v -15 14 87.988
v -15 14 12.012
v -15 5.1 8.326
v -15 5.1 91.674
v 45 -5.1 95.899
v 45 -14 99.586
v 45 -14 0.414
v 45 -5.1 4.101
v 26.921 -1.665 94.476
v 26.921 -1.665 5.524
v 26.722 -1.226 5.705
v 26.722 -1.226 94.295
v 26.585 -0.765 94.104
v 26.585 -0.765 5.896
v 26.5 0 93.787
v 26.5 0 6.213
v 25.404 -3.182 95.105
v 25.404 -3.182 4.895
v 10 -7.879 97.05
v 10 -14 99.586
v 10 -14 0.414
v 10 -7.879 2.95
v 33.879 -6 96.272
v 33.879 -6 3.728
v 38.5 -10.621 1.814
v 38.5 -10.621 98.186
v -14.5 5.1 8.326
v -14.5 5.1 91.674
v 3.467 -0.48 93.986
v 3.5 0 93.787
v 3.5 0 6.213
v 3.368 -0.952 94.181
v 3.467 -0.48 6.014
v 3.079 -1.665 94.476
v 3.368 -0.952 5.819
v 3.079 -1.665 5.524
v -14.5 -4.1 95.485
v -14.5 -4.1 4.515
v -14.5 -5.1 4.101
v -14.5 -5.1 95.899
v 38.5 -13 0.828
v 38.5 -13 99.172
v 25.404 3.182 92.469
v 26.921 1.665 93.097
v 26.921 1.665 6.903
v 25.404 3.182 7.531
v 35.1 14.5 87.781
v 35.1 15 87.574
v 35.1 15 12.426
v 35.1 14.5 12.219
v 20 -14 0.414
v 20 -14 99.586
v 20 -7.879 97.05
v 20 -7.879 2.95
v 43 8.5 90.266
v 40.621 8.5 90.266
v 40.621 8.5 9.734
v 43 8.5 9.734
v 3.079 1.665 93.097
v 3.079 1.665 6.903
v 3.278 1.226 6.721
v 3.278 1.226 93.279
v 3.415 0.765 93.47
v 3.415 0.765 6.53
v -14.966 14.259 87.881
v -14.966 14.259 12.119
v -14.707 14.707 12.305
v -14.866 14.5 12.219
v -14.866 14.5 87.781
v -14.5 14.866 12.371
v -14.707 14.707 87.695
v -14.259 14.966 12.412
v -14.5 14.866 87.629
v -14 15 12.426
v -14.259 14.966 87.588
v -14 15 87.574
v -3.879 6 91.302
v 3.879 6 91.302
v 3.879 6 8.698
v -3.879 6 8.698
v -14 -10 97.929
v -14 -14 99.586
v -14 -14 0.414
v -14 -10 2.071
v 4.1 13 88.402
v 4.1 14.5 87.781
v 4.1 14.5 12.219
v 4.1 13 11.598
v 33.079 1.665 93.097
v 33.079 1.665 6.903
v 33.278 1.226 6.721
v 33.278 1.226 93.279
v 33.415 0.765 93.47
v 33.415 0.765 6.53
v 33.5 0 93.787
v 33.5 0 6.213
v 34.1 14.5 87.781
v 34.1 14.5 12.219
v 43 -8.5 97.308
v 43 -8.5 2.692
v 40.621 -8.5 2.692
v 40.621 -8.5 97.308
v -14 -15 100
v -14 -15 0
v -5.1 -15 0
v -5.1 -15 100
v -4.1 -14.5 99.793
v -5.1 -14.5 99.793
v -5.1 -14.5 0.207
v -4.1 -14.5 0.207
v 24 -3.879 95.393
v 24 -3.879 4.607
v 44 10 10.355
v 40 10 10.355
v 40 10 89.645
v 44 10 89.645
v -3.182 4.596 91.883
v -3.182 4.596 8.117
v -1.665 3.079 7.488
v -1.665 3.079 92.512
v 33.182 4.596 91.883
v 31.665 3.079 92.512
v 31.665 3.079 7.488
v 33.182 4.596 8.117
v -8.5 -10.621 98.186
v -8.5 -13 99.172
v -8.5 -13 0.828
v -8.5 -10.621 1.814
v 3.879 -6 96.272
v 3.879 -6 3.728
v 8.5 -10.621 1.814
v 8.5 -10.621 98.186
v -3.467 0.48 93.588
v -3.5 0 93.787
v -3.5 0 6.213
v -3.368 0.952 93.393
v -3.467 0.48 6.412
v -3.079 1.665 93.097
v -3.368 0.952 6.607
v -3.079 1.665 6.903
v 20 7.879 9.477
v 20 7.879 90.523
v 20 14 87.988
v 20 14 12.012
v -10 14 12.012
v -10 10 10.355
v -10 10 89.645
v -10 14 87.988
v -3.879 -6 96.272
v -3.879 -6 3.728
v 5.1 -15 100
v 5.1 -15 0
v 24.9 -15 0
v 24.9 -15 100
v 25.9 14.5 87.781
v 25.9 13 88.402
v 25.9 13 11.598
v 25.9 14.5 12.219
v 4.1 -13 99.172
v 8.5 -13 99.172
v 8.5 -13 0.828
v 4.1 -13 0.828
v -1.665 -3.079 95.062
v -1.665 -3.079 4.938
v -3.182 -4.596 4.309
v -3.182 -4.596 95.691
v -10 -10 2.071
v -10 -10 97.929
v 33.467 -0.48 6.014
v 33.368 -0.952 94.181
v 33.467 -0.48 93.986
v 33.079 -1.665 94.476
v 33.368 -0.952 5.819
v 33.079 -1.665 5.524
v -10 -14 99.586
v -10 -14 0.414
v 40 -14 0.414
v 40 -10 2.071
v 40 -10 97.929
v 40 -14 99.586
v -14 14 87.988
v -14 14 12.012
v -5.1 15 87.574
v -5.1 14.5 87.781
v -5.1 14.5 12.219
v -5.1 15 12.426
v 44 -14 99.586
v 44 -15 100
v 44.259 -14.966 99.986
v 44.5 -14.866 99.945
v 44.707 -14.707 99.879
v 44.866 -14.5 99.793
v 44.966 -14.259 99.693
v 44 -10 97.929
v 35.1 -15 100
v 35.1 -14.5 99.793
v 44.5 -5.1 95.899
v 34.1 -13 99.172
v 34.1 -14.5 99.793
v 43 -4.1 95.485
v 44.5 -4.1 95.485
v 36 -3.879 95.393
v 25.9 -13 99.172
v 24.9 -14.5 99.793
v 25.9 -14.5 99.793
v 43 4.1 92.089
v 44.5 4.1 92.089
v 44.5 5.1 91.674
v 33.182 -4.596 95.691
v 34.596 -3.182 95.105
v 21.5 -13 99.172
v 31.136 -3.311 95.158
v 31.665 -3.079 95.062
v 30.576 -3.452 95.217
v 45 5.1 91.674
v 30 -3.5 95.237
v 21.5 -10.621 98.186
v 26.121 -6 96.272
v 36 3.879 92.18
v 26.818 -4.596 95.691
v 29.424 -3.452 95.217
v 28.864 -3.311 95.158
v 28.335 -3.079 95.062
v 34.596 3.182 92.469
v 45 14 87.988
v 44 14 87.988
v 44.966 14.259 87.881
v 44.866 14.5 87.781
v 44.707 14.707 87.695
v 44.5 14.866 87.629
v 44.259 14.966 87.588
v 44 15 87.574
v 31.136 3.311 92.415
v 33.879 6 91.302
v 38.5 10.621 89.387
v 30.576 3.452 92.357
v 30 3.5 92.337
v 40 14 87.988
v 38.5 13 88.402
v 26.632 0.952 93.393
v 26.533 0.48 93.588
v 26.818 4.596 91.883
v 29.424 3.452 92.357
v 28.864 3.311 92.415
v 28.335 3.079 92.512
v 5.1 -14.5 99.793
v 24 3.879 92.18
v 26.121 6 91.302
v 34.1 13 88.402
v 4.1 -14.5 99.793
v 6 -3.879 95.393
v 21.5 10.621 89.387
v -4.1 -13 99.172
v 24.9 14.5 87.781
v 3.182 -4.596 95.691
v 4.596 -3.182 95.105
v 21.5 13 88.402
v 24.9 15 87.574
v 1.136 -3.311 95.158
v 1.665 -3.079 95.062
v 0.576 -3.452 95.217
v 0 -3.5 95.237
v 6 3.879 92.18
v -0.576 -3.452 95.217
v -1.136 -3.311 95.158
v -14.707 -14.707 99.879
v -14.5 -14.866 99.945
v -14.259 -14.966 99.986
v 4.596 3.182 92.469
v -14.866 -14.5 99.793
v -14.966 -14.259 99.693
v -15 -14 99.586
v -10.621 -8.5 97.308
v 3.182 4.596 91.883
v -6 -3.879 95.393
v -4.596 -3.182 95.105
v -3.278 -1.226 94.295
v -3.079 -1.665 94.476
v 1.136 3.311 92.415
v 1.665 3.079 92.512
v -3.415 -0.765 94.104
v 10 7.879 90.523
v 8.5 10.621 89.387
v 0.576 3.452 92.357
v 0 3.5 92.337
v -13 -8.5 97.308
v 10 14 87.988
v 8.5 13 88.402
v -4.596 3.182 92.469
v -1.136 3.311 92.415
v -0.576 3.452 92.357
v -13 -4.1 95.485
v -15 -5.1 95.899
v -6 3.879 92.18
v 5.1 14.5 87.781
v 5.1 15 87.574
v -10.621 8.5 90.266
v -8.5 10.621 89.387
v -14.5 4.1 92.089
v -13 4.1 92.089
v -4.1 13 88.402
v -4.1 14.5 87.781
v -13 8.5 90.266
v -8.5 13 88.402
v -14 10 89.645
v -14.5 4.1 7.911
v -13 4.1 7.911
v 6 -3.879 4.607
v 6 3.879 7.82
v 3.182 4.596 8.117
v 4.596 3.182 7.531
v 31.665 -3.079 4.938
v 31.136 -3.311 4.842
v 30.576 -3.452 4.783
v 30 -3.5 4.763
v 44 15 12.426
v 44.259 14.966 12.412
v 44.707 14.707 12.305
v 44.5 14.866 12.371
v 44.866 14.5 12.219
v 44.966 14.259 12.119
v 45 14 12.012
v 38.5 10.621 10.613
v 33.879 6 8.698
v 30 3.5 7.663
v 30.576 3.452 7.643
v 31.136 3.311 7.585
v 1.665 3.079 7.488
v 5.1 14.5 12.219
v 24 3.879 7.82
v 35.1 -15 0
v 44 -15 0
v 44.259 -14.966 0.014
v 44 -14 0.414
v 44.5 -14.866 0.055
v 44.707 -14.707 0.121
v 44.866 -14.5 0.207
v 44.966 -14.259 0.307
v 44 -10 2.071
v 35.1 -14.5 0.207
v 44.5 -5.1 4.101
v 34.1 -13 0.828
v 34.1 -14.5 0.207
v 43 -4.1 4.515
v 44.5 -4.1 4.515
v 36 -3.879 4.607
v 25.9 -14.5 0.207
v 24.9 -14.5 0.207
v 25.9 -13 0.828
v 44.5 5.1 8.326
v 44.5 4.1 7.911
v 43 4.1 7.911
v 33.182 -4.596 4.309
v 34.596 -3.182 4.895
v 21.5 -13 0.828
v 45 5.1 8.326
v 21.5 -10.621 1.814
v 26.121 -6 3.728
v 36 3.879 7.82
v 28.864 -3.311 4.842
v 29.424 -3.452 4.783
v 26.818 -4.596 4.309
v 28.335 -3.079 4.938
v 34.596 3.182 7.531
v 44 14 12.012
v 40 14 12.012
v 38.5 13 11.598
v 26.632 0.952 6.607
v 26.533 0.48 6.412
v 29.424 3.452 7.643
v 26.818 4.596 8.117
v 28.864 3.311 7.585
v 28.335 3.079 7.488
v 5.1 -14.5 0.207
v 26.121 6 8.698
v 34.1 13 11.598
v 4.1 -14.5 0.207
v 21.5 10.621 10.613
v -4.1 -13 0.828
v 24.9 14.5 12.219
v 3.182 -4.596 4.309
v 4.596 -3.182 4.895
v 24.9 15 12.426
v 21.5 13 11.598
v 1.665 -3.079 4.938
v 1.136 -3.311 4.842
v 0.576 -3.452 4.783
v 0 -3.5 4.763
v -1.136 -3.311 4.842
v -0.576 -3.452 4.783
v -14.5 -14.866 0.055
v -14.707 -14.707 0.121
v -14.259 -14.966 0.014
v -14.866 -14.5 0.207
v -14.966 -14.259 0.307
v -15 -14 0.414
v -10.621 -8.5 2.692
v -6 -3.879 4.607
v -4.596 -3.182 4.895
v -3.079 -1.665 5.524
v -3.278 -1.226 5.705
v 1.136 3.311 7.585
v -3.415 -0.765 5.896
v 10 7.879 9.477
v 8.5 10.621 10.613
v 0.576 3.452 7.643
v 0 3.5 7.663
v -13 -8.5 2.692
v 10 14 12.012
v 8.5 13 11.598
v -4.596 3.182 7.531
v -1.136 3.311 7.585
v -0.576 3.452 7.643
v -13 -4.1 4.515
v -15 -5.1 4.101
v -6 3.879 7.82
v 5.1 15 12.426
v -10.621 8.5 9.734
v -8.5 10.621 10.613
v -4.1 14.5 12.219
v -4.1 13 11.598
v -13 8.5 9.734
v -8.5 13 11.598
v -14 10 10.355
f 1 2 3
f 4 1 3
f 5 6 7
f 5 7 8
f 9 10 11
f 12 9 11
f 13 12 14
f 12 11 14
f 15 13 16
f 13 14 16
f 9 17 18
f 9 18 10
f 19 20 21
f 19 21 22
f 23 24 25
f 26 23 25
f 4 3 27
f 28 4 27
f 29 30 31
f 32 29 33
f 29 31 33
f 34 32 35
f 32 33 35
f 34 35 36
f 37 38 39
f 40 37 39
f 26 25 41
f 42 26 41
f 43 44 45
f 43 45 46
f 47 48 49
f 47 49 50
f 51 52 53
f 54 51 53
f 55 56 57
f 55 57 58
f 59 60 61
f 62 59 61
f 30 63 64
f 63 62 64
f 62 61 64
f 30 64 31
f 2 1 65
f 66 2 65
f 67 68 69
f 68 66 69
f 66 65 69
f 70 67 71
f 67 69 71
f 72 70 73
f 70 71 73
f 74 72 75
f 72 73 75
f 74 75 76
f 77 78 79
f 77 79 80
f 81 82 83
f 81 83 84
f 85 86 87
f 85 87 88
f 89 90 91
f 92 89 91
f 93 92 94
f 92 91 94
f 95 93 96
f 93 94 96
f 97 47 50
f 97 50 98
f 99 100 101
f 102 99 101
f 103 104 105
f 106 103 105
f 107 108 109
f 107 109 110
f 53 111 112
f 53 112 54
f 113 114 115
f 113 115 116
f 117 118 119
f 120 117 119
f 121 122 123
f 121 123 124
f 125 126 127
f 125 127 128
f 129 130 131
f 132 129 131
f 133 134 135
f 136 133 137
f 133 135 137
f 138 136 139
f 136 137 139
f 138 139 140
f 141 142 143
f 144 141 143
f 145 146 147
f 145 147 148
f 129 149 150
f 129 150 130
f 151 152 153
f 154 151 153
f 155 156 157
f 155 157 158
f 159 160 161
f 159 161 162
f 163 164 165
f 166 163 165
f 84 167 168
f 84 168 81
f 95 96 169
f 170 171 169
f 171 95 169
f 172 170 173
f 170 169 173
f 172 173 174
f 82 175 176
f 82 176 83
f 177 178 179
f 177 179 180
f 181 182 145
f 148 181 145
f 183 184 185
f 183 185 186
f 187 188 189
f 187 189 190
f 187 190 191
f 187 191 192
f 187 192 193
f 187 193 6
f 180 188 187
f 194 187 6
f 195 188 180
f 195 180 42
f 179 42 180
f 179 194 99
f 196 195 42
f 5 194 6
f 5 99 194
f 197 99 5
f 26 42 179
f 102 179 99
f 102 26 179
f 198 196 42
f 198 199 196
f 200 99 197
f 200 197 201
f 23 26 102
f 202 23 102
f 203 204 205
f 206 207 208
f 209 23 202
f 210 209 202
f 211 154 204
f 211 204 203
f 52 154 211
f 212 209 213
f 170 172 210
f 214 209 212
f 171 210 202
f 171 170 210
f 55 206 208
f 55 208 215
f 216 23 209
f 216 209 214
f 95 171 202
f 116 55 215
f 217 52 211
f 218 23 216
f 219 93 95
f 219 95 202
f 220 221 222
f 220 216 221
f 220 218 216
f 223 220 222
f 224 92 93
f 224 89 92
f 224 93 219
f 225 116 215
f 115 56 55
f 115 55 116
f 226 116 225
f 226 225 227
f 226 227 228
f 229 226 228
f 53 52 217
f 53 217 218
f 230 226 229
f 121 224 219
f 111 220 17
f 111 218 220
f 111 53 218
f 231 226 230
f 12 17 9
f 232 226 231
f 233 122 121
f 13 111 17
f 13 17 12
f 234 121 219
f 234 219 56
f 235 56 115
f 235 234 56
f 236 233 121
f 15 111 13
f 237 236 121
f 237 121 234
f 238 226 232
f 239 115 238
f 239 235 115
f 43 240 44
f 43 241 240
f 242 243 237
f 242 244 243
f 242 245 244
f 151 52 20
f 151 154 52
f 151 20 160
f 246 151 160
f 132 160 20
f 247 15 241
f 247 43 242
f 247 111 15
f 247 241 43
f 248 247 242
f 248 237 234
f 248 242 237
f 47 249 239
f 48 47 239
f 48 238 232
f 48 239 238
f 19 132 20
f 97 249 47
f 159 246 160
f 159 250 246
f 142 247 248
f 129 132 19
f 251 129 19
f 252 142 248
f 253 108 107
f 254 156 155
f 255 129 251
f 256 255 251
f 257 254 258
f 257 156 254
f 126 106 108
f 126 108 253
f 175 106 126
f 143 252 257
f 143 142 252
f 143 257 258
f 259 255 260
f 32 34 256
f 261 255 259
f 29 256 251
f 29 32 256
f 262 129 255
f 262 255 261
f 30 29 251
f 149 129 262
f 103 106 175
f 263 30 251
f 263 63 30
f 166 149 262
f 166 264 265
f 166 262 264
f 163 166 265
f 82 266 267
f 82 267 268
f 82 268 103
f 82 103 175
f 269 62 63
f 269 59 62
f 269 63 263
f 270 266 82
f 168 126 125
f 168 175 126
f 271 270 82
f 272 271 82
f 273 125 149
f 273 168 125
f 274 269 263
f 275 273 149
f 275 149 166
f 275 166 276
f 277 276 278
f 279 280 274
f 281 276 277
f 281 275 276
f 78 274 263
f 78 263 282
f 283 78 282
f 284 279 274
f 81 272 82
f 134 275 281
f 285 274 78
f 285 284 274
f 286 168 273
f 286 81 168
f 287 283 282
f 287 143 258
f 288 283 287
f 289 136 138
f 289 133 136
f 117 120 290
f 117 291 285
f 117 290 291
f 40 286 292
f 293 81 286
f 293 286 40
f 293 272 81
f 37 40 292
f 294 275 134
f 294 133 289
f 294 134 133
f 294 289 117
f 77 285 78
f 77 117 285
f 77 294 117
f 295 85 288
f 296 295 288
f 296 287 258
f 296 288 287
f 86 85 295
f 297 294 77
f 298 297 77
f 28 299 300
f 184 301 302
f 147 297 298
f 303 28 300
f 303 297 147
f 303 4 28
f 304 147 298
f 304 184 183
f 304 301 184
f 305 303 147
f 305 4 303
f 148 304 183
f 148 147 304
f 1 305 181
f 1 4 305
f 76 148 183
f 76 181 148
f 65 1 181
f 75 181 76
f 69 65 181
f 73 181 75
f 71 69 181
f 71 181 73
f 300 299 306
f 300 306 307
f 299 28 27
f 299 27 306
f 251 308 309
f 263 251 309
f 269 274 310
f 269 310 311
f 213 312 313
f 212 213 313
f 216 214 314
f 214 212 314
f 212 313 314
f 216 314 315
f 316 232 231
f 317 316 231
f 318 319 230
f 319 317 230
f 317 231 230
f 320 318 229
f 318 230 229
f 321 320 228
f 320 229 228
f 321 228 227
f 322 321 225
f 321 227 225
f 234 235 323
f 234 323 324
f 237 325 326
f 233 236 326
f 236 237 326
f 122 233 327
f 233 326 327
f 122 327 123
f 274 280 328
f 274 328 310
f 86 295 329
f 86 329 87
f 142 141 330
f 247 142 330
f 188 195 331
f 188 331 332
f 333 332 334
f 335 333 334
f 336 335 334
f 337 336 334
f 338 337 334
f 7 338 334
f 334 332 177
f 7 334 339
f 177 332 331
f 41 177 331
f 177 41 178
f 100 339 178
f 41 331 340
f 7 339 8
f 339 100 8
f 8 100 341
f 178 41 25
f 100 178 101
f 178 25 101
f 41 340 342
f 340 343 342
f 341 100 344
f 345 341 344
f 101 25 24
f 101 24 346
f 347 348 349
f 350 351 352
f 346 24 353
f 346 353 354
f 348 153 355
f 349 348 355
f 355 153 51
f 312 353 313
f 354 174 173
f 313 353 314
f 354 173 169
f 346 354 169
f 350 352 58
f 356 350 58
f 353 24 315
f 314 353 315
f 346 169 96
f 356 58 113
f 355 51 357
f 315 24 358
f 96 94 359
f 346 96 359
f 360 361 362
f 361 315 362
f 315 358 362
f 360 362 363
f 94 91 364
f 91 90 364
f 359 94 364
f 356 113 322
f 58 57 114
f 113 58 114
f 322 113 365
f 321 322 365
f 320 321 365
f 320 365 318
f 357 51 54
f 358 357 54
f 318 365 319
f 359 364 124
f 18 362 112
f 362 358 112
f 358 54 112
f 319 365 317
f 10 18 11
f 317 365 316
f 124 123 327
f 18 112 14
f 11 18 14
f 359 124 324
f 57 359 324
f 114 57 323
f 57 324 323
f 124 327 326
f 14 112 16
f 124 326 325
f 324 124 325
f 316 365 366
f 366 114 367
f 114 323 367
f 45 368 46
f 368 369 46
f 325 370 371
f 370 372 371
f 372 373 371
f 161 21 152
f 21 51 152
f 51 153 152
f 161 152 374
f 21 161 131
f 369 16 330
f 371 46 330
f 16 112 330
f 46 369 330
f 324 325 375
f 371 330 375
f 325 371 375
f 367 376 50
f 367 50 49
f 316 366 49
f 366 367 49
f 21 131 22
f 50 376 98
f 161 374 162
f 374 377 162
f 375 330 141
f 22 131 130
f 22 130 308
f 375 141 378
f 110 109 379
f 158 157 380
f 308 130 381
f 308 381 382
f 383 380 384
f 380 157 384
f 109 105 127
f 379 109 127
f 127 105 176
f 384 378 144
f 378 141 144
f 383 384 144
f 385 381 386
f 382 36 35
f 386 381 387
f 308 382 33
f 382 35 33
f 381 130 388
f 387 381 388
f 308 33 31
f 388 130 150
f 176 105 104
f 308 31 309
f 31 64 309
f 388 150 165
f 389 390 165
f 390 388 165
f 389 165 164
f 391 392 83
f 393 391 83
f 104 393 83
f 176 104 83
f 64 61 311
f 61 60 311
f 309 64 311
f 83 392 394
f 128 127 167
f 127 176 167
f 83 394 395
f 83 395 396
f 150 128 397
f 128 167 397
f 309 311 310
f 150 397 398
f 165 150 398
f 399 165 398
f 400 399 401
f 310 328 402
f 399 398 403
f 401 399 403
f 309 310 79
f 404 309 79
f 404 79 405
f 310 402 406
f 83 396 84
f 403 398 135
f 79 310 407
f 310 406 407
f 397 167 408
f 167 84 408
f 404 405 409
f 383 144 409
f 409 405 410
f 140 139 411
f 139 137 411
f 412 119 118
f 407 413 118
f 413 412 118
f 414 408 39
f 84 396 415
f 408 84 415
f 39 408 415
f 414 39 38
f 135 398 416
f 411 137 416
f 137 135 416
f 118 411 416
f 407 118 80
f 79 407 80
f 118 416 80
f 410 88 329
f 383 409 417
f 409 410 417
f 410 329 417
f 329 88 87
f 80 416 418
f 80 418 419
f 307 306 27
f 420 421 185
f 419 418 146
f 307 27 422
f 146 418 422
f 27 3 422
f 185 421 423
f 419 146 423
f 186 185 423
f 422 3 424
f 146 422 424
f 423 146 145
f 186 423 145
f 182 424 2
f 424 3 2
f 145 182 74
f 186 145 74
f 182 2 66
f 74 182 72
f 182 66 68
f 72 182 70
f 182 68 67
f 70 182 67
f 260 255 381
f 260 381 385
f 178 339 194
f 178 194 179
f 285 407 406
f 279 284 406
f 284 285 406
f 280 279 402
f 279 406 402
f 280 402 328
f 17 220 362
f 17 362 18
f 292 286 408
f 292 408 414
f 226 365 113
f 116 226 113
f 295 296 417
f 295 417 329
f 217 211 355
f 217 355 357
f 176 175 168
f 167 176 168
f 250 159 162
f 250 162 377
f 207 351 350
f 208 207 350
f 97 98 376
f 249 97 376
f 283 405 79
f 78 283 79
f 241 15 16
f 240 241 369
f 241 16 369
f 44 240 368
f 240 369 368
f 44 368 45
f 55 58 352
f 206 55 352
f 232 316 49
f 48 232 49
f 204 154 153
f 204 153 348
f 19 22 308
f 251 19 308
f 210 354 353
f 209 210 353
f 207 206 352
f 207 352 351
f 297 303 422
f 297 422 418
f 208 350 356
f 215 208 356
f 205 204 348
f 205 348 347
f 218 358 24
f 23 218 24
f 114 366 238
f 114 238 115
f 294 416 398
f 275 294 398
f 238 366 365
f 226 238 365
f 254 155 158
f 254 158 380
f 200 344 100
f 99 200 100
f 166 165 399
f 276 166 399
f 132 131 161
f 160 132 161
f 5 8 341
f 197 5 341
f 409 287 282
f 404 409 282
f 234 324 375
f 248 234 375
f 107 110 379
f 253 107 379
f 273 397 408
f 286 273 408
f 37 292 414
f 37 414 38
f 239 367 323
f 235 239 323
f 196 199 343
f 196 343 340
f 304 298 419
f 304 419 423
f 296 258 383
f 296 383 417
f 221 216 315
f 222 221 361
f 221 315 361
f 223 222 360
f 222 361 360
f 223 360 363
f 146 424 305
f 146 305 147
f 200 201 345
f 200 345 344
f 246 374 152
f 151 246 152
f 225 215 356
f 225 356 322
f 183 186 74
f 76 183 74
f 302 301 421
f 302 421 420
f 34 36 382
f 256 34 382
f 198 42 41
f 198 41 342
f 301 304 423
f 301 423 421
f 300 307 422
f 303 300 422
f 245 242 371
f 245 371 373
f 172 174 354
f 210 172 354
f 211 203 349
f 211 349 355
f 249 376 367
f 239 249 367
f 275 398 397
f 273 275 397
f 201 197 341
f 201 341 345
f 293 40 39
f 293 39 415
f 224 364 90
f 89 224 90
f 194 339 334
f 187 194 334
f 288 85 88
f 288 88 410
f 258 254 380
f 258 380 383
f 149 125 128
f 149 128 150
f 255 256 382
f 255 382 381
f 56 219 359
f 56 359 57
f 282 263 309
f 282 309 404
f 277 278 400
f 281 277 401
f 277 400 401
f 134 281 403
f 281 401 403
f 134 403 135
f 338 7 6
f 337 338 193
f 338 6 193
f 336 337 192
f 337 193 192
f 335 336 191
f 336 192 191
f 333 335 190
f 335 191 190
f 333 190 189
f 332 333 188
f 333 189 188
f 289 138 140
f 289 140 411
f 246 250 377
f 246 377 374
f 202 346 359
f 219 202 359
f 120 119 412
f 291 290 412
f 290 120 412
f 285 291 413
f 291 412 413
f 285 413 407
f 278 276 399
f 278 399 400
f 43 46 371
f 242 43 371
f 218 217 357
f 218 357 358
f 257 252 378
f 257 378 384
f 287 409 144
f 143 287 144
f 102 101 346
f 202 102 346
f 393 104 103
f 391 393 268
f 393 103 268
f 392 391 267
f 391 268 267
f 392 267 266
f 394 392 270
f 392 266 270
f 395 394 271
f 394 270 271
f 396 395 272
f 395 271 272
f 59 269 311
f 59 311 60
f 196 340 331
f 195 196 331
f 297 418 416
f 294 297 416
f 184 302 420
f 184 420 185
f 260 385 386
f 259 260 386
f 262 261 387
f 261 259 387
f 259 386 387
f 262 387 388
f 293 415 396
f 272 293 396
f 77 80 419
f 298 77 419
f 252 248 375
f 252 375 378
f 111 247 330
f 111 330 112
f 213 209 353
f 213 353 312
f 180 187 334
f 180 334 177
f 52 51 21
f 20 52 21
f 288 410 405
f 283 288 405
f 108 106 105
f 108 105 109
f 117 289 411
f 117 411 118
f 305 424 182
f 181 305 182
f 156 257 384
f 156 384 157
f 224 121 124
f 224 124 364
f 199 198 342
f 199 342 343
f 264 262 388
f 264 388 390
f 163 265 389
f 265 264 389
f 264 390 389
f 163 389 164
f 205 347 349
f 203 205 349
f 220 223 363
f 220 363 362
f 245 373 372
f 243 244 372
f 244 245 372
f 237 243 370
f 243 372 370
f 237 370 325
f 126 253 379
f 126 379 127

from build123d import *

# Parameters (mm, degrees)
ESBO_O1_W                      = 4
ESBO_O1_H                      = 4
RESSALTO_EXTRUS_O1_DEPTH       = 100
PADR_OCIRCULAR1_COUNT          = 4
PADR_O_LINEAR1_COUNT           = 2
PADR_O_LINEAR1_PITCH           = 30
PADR_O_LINEAR1_COPY_1_SKETCH_W = 4
PADR_O_LINEAR1_COPY_1_SKETCH_H = 4
PADR_O_LINEAR1_COPY_1_DEPTH    = 100
PADR_O_LINEAR1_COPY_2_SKETCH_W = 4
PADR_O_LINEAR1_COPY_2_SKETCH_H = 4
PADR_O_LINEAR1_COPY_2_DEPTH    = 100
PADR_O_LINEAR1_COPY_3_SKETCH_W = 4
PADR_O_LINEAR1_COPY_3_SKETCH_H = 4
PADR_O_LINEAR1_COPY_3_DEPTH    = 100
ESBO_O4_W                      = 10
ESBO_O4_H                      = 28
CORTE_EXTRUS_O1_DEPTH          = 111.679718106
FILETE1_R                      = 1
CUT_EXTRUDE1_DEPTH             = 118.579760163


with BuildPart() as part:
    # Esboço1 → Ressalto-extrusão1 (new body)
    with BuildSketch(Plane.XY):
        with BuildLine():
            ThreePointArc((-1.664601464, 3.078815026), (-0.858529967, 3.393070335), (0, 3.5))
            Line((0, 3.5), (0, 6))
            Line((0, 6), (-3.878679656, 6))
            Line((-3.878679656, 6), (-8.5, 10.621320344))
            Line((-8.5, 10.621320344), (-8.5, 13))
            Line((-8.5, 13), (-4.1, 13))
            Line((-4.1, 13), (-4.1, 14.5))
            Line((-4.1, 14.5), (-5.1, 14.5))
            Line((-5.1, 14.5), (-5.1, 15))
            Line((-5.1, 15), (-15, 15))
            Line((-15, 15), (-15, 5.1))
            Line((-15, 5.1), (-14.5, 5.1))
            Line((-14.5, 5.1), (-14.5, 4.1))
            Line((-14.5, 4.1), (-13, 4.1))
            Line((-13, 4.1), (-13, 8.5))
            Line((-13, 8.5), (-10.621320344, 8.5))
            Line((-10.621320344, 8.5), (-6, 3.878679656))
            Line((-6, 3.878679656), (-6, 0))
            Line((-6, 0), (-3.5, 0))
            ThreePointArc((-3.5, 0), (-3.393070335, 0.858529967), (-3.078815026, 1.664601464))
            Line((-3.078815026, 1.664601464), (-4.596194078, 3.181980515))
            Line((-4.596194078, 3.181980515), (-3.181980515, 4.596194078))
            Line((-3.181980515, 4.596194078), (-1.664601464, 3.078815026))
        make_face()
        with Locations((-12, 12)):
            Rectangle(ESBO_O1_W, ESBO_O1_H, mode=Mode.SUBTRACT)
    ressalto_extrus_o1 = extrude(amount=RESSALTO_EXTRUS_O1_DEPTH)

    # PadrãoCircular1: Ressalto-extrusão1 ×4 about axis
    padr_ocircular1_axis = Axis((0, 0, 0), (0, 0, 1))
    for i in range(1, PADR_OCIRCULAR1_COUNT):
        add(ressalto_extrus_o1.rotate(padr_ocircular1_axis, i * 360 / PADR_OCIRCULAR1_COUNT))

    # Padrão linear1: Ressalto-extrusão1 ×2
    with Locations(*[(i * PADR_O_LINEAR1_PITCH, 0, 0) for i in range(1, PADR_O_LINEAR1_COUNT)]):
        add(ressalto_extrus_o1)

    # Padrão linear1 copy 1 sketch → Padrão linear1 copy 1 (add)
    with BuildSketch(Plane(origin=(30, 0, 0), x_dir=(0, 1, 0), z_dir=(0, 0, 1))):
        with BuildLine():
            ThreePointArc((-1.664601464, 3.078815026), (-0.858529967, 3.393070335), (0, 3.5))
            Line((0, 3.5), (0, 6))
            Line((0, 6), (-3.878679656, 6))
            Line((-3.878679656, 6), (-8.5, 10.621320344))
            Line((-8.5, 10.621320344), (-8.5, 13))
            Line((-8.5, 13), (-4.1, 13))
            Line((-4.1, 13), (-4.1, 14.5))
            Line((-4.1, 14.5), (-5.1, 14.5))
            Line((-5.1, 14.5), (-5.1, 15))
            Line((-5.1, 15), (-15, 15))
            Line((-15, 15), (-15, 5.1))
            Line((-15, 5.1), (-14.5, 5.1))
            Line((-14.5, 5.1), (-14.5, 4.1))
            Line((-14.5, 4.1), (-13, 4.1))
            Line((-13, 4.1), (-13, 8.5))
            Line((-13, 8.5), (-10.621320344, 8.5))
            Line((-10.621320344, 8.5), (-6, 3.878679656))
            Line((-6, 3.878679656), (-6, 0))
            Line((-6, 0), (-3.5, 0))
            ThreePointArc((-3.5, 0), (-3.393070335, 0.858529967), (-3.078815026, 1.664601464))
            Line((-3.078815026, 1.664601464), (-4.596194078, 3.181980515))
            Line((-4.596194078, 3.181980515), (-3.181980515, 4.596194078))
            Line((-3.181980515, 4.596194078), (-1.664601464, 3.078815026))
        make_face()
        with Locations((-12, 12)):
            Rectangle(PADR_O_LINEAR1_COPY_1_SKETCH_W, PADR_O_LINEAR1_COPY_1_SKETCH_H, mode=Mode.SUBTRACT)
    extrude(amount=PADR_O_LINEAR1_COPY_1_DEPTH)

    # Padrão linear1 copy 2 sketch → Padrão linear1 copy 2 (add)
    with BuildSketch(Plane(origin=(30, 0, 0), x_dir=(-1, 0, 0), z_dir=(0, 0, 1))):
        with BuildLine():
            ThreePointArc((-1.664601464, 3.078815026), (-0.858529967, 3.393070335), (0, 3.5))
            Line((0, 3.5), (0, 6))
            Line((0, 6), (-3.878679656, 6))
            Line((-3.878679656, 6), (-8.5, 10.621320344))
            Line((-8.5, 10.621320344), (-8.5, 13))
            Line((-8.5, 13), (-4.1, 13))
            Line((-4.1, 13), (-4.1, 14.5))
            Line((-4.1, 14.5), (-5.1, 14.5))
            Line((-5.1, 14.5), (-5.1, 15))
            Line((-5.1, 15), (-15, 15))
            Line((-15, 15), (-15, 5.1))
            Line((-15, 5.1), (-14.5, 5.1))
            Line((-14.5, 5.1), (-14.5, 4.1))
            Line((-14.5, 4.1), (-13, 4.1))
            Line((-13, 4.1), (-13, 8.5))
            Line((-13, 8.5), (-10.621320344, 8.5))
            Line((-10.621320344, 8.5), (-6, 3.878679656))
            Line((-6, 3.878679656), (-6, 0))
            Line((-6, 0), (-3.5, 0))
            ThreePointArc((-3.5, 0), (-3.393070335, 0.858529967), (-3.078815026, 1.664601464))
            Line((-3.078815026, 1.664601464), (-4.596194078, 3.181980515))
            Line((-4.596194078, 3.181980515), (-3.181980515, 4.596194078))
            Line((-3.181980515, 4.596194078), (-1.664601464, 3.078815026))
        make_face()
        with Locations((-12, 12)):
            Rectangle(PADR_O_LINEAR1_COPY_2_SKETCH_W, PADR_O_LINEAR1_COPY_2_SKETCH_H, mode=Mode.SUBTRACT)
    extrude(amount=PADR_O_LINEAR1_COPY_2_DEPTH)

    # Padrão linear1 copy 3 sketch → Padrão linear1 copy 3 (add)
    with BuildSketch(Plane(origin=(30, 0, 0), x_dir=(0, -1, 0), z_dir=(0, 0, 1))):
        with BuildLine():
            ThreePointArc((-1.664601464, 3.078815026), (-0.858529967, 3.393070335), (0, 3.5))
            Line((0, 3.5), (0, 6))
            Line((0, 6), (-3.878679656, 6))
            Line((-3.878679656, 6), (-8.5, 10.621320344))
            Line((-8.5, 10.621320344), (-8.5, 13))
            Line((-8.5, 13), (-4.1, 13))
            Line((-4.1, 13), (-4.1, 14.5))
            Line((-4.1, 14.5), (-5.1, 14.5))
            Line((-5.1, 14.5), (-5.1, 15))
            Line((-5.1, 15), (-15, 15))
            Line((-15, 15), (-15, 5.1))
            Line((-15, 5.1), (-14.5, 5.1))
            Line((-14.5, 5.1), (-14.5, 4.1))
            Line((-14.5, 4.1), (-13, 4.1))
            Line((-13, 4.1), (-13, 8.5))
            Line((-13, 8.5), (-10.621320344, 8.5))
            Line((-10.621320344, 8.5), (-6, 3.878679656))
            Line((-6, 3.878679656), (-6, 0))
            Line((-6, 0), (-3.5, 0))
            ThreePointArc((-3.5, 0), (-3.393070335, 0.858529967), (-3.078815026, 1.664601464))
            Line((-3.078815026, 1.664601464), (-4.596194078, 3.181980515))
            Line((-4.596194078, 3.181980515), (-3.181980515, 4.596194078))
            Line((-3.181980515, 4.596194078), (-1.664601464, 3.078815026))
        make_face()
        with Locations((-12, 12)):
            Rectangle(PADR_O_LINEAR1_COPY_3_SKETCH_W, PADR_O_LINEAR1_COPY_3_SKETCH_H, mode=Mode.SUBTRACT)
    extrude(amount=PADR_O_LINEAR1_COPY_3_DEPTH)

    # Esboço4 → Corte-extrusão1 (cut, through all)
    with BuildSketch(Plane(origin=(0, 0, 0), x_dir=(-1, 0, 0), z_dir=(0, 0, -1))):
        with Locations((-15, 0)):
            Rectangle(ESBO_O4_W, ESBO_O4_H)
    extrude(amount=-CORTE_EXTRUS_O1_DEPTH, mode=Mode.SUBTRACT)

    # Filete1
    filete1_edges = [part.edges().sort_by_distance(p)[0] for p in [
        (45, -15, 50),
        (45, 15, 50),
        (-15, 15, 50),
        (-15, -15, 50),
    ]]
    fillet(filete1_edges, radius=FILETE1_R)

    # Sketch1 → Cut-Extrude1 (cut, through all)
    with BuildSketch(Plane.ZY.offset(15)):
        Polygon((0, -15), (12.426406871, 15), (0, 15), align=None)
        Polygon((100, -15), (87.573593129, 15), (100, 15), align=None)
    extrude(amount=-CUT_EXTRUDE1_DEPTH, mode=Mode.SUBTRACT)


solid = part.part
